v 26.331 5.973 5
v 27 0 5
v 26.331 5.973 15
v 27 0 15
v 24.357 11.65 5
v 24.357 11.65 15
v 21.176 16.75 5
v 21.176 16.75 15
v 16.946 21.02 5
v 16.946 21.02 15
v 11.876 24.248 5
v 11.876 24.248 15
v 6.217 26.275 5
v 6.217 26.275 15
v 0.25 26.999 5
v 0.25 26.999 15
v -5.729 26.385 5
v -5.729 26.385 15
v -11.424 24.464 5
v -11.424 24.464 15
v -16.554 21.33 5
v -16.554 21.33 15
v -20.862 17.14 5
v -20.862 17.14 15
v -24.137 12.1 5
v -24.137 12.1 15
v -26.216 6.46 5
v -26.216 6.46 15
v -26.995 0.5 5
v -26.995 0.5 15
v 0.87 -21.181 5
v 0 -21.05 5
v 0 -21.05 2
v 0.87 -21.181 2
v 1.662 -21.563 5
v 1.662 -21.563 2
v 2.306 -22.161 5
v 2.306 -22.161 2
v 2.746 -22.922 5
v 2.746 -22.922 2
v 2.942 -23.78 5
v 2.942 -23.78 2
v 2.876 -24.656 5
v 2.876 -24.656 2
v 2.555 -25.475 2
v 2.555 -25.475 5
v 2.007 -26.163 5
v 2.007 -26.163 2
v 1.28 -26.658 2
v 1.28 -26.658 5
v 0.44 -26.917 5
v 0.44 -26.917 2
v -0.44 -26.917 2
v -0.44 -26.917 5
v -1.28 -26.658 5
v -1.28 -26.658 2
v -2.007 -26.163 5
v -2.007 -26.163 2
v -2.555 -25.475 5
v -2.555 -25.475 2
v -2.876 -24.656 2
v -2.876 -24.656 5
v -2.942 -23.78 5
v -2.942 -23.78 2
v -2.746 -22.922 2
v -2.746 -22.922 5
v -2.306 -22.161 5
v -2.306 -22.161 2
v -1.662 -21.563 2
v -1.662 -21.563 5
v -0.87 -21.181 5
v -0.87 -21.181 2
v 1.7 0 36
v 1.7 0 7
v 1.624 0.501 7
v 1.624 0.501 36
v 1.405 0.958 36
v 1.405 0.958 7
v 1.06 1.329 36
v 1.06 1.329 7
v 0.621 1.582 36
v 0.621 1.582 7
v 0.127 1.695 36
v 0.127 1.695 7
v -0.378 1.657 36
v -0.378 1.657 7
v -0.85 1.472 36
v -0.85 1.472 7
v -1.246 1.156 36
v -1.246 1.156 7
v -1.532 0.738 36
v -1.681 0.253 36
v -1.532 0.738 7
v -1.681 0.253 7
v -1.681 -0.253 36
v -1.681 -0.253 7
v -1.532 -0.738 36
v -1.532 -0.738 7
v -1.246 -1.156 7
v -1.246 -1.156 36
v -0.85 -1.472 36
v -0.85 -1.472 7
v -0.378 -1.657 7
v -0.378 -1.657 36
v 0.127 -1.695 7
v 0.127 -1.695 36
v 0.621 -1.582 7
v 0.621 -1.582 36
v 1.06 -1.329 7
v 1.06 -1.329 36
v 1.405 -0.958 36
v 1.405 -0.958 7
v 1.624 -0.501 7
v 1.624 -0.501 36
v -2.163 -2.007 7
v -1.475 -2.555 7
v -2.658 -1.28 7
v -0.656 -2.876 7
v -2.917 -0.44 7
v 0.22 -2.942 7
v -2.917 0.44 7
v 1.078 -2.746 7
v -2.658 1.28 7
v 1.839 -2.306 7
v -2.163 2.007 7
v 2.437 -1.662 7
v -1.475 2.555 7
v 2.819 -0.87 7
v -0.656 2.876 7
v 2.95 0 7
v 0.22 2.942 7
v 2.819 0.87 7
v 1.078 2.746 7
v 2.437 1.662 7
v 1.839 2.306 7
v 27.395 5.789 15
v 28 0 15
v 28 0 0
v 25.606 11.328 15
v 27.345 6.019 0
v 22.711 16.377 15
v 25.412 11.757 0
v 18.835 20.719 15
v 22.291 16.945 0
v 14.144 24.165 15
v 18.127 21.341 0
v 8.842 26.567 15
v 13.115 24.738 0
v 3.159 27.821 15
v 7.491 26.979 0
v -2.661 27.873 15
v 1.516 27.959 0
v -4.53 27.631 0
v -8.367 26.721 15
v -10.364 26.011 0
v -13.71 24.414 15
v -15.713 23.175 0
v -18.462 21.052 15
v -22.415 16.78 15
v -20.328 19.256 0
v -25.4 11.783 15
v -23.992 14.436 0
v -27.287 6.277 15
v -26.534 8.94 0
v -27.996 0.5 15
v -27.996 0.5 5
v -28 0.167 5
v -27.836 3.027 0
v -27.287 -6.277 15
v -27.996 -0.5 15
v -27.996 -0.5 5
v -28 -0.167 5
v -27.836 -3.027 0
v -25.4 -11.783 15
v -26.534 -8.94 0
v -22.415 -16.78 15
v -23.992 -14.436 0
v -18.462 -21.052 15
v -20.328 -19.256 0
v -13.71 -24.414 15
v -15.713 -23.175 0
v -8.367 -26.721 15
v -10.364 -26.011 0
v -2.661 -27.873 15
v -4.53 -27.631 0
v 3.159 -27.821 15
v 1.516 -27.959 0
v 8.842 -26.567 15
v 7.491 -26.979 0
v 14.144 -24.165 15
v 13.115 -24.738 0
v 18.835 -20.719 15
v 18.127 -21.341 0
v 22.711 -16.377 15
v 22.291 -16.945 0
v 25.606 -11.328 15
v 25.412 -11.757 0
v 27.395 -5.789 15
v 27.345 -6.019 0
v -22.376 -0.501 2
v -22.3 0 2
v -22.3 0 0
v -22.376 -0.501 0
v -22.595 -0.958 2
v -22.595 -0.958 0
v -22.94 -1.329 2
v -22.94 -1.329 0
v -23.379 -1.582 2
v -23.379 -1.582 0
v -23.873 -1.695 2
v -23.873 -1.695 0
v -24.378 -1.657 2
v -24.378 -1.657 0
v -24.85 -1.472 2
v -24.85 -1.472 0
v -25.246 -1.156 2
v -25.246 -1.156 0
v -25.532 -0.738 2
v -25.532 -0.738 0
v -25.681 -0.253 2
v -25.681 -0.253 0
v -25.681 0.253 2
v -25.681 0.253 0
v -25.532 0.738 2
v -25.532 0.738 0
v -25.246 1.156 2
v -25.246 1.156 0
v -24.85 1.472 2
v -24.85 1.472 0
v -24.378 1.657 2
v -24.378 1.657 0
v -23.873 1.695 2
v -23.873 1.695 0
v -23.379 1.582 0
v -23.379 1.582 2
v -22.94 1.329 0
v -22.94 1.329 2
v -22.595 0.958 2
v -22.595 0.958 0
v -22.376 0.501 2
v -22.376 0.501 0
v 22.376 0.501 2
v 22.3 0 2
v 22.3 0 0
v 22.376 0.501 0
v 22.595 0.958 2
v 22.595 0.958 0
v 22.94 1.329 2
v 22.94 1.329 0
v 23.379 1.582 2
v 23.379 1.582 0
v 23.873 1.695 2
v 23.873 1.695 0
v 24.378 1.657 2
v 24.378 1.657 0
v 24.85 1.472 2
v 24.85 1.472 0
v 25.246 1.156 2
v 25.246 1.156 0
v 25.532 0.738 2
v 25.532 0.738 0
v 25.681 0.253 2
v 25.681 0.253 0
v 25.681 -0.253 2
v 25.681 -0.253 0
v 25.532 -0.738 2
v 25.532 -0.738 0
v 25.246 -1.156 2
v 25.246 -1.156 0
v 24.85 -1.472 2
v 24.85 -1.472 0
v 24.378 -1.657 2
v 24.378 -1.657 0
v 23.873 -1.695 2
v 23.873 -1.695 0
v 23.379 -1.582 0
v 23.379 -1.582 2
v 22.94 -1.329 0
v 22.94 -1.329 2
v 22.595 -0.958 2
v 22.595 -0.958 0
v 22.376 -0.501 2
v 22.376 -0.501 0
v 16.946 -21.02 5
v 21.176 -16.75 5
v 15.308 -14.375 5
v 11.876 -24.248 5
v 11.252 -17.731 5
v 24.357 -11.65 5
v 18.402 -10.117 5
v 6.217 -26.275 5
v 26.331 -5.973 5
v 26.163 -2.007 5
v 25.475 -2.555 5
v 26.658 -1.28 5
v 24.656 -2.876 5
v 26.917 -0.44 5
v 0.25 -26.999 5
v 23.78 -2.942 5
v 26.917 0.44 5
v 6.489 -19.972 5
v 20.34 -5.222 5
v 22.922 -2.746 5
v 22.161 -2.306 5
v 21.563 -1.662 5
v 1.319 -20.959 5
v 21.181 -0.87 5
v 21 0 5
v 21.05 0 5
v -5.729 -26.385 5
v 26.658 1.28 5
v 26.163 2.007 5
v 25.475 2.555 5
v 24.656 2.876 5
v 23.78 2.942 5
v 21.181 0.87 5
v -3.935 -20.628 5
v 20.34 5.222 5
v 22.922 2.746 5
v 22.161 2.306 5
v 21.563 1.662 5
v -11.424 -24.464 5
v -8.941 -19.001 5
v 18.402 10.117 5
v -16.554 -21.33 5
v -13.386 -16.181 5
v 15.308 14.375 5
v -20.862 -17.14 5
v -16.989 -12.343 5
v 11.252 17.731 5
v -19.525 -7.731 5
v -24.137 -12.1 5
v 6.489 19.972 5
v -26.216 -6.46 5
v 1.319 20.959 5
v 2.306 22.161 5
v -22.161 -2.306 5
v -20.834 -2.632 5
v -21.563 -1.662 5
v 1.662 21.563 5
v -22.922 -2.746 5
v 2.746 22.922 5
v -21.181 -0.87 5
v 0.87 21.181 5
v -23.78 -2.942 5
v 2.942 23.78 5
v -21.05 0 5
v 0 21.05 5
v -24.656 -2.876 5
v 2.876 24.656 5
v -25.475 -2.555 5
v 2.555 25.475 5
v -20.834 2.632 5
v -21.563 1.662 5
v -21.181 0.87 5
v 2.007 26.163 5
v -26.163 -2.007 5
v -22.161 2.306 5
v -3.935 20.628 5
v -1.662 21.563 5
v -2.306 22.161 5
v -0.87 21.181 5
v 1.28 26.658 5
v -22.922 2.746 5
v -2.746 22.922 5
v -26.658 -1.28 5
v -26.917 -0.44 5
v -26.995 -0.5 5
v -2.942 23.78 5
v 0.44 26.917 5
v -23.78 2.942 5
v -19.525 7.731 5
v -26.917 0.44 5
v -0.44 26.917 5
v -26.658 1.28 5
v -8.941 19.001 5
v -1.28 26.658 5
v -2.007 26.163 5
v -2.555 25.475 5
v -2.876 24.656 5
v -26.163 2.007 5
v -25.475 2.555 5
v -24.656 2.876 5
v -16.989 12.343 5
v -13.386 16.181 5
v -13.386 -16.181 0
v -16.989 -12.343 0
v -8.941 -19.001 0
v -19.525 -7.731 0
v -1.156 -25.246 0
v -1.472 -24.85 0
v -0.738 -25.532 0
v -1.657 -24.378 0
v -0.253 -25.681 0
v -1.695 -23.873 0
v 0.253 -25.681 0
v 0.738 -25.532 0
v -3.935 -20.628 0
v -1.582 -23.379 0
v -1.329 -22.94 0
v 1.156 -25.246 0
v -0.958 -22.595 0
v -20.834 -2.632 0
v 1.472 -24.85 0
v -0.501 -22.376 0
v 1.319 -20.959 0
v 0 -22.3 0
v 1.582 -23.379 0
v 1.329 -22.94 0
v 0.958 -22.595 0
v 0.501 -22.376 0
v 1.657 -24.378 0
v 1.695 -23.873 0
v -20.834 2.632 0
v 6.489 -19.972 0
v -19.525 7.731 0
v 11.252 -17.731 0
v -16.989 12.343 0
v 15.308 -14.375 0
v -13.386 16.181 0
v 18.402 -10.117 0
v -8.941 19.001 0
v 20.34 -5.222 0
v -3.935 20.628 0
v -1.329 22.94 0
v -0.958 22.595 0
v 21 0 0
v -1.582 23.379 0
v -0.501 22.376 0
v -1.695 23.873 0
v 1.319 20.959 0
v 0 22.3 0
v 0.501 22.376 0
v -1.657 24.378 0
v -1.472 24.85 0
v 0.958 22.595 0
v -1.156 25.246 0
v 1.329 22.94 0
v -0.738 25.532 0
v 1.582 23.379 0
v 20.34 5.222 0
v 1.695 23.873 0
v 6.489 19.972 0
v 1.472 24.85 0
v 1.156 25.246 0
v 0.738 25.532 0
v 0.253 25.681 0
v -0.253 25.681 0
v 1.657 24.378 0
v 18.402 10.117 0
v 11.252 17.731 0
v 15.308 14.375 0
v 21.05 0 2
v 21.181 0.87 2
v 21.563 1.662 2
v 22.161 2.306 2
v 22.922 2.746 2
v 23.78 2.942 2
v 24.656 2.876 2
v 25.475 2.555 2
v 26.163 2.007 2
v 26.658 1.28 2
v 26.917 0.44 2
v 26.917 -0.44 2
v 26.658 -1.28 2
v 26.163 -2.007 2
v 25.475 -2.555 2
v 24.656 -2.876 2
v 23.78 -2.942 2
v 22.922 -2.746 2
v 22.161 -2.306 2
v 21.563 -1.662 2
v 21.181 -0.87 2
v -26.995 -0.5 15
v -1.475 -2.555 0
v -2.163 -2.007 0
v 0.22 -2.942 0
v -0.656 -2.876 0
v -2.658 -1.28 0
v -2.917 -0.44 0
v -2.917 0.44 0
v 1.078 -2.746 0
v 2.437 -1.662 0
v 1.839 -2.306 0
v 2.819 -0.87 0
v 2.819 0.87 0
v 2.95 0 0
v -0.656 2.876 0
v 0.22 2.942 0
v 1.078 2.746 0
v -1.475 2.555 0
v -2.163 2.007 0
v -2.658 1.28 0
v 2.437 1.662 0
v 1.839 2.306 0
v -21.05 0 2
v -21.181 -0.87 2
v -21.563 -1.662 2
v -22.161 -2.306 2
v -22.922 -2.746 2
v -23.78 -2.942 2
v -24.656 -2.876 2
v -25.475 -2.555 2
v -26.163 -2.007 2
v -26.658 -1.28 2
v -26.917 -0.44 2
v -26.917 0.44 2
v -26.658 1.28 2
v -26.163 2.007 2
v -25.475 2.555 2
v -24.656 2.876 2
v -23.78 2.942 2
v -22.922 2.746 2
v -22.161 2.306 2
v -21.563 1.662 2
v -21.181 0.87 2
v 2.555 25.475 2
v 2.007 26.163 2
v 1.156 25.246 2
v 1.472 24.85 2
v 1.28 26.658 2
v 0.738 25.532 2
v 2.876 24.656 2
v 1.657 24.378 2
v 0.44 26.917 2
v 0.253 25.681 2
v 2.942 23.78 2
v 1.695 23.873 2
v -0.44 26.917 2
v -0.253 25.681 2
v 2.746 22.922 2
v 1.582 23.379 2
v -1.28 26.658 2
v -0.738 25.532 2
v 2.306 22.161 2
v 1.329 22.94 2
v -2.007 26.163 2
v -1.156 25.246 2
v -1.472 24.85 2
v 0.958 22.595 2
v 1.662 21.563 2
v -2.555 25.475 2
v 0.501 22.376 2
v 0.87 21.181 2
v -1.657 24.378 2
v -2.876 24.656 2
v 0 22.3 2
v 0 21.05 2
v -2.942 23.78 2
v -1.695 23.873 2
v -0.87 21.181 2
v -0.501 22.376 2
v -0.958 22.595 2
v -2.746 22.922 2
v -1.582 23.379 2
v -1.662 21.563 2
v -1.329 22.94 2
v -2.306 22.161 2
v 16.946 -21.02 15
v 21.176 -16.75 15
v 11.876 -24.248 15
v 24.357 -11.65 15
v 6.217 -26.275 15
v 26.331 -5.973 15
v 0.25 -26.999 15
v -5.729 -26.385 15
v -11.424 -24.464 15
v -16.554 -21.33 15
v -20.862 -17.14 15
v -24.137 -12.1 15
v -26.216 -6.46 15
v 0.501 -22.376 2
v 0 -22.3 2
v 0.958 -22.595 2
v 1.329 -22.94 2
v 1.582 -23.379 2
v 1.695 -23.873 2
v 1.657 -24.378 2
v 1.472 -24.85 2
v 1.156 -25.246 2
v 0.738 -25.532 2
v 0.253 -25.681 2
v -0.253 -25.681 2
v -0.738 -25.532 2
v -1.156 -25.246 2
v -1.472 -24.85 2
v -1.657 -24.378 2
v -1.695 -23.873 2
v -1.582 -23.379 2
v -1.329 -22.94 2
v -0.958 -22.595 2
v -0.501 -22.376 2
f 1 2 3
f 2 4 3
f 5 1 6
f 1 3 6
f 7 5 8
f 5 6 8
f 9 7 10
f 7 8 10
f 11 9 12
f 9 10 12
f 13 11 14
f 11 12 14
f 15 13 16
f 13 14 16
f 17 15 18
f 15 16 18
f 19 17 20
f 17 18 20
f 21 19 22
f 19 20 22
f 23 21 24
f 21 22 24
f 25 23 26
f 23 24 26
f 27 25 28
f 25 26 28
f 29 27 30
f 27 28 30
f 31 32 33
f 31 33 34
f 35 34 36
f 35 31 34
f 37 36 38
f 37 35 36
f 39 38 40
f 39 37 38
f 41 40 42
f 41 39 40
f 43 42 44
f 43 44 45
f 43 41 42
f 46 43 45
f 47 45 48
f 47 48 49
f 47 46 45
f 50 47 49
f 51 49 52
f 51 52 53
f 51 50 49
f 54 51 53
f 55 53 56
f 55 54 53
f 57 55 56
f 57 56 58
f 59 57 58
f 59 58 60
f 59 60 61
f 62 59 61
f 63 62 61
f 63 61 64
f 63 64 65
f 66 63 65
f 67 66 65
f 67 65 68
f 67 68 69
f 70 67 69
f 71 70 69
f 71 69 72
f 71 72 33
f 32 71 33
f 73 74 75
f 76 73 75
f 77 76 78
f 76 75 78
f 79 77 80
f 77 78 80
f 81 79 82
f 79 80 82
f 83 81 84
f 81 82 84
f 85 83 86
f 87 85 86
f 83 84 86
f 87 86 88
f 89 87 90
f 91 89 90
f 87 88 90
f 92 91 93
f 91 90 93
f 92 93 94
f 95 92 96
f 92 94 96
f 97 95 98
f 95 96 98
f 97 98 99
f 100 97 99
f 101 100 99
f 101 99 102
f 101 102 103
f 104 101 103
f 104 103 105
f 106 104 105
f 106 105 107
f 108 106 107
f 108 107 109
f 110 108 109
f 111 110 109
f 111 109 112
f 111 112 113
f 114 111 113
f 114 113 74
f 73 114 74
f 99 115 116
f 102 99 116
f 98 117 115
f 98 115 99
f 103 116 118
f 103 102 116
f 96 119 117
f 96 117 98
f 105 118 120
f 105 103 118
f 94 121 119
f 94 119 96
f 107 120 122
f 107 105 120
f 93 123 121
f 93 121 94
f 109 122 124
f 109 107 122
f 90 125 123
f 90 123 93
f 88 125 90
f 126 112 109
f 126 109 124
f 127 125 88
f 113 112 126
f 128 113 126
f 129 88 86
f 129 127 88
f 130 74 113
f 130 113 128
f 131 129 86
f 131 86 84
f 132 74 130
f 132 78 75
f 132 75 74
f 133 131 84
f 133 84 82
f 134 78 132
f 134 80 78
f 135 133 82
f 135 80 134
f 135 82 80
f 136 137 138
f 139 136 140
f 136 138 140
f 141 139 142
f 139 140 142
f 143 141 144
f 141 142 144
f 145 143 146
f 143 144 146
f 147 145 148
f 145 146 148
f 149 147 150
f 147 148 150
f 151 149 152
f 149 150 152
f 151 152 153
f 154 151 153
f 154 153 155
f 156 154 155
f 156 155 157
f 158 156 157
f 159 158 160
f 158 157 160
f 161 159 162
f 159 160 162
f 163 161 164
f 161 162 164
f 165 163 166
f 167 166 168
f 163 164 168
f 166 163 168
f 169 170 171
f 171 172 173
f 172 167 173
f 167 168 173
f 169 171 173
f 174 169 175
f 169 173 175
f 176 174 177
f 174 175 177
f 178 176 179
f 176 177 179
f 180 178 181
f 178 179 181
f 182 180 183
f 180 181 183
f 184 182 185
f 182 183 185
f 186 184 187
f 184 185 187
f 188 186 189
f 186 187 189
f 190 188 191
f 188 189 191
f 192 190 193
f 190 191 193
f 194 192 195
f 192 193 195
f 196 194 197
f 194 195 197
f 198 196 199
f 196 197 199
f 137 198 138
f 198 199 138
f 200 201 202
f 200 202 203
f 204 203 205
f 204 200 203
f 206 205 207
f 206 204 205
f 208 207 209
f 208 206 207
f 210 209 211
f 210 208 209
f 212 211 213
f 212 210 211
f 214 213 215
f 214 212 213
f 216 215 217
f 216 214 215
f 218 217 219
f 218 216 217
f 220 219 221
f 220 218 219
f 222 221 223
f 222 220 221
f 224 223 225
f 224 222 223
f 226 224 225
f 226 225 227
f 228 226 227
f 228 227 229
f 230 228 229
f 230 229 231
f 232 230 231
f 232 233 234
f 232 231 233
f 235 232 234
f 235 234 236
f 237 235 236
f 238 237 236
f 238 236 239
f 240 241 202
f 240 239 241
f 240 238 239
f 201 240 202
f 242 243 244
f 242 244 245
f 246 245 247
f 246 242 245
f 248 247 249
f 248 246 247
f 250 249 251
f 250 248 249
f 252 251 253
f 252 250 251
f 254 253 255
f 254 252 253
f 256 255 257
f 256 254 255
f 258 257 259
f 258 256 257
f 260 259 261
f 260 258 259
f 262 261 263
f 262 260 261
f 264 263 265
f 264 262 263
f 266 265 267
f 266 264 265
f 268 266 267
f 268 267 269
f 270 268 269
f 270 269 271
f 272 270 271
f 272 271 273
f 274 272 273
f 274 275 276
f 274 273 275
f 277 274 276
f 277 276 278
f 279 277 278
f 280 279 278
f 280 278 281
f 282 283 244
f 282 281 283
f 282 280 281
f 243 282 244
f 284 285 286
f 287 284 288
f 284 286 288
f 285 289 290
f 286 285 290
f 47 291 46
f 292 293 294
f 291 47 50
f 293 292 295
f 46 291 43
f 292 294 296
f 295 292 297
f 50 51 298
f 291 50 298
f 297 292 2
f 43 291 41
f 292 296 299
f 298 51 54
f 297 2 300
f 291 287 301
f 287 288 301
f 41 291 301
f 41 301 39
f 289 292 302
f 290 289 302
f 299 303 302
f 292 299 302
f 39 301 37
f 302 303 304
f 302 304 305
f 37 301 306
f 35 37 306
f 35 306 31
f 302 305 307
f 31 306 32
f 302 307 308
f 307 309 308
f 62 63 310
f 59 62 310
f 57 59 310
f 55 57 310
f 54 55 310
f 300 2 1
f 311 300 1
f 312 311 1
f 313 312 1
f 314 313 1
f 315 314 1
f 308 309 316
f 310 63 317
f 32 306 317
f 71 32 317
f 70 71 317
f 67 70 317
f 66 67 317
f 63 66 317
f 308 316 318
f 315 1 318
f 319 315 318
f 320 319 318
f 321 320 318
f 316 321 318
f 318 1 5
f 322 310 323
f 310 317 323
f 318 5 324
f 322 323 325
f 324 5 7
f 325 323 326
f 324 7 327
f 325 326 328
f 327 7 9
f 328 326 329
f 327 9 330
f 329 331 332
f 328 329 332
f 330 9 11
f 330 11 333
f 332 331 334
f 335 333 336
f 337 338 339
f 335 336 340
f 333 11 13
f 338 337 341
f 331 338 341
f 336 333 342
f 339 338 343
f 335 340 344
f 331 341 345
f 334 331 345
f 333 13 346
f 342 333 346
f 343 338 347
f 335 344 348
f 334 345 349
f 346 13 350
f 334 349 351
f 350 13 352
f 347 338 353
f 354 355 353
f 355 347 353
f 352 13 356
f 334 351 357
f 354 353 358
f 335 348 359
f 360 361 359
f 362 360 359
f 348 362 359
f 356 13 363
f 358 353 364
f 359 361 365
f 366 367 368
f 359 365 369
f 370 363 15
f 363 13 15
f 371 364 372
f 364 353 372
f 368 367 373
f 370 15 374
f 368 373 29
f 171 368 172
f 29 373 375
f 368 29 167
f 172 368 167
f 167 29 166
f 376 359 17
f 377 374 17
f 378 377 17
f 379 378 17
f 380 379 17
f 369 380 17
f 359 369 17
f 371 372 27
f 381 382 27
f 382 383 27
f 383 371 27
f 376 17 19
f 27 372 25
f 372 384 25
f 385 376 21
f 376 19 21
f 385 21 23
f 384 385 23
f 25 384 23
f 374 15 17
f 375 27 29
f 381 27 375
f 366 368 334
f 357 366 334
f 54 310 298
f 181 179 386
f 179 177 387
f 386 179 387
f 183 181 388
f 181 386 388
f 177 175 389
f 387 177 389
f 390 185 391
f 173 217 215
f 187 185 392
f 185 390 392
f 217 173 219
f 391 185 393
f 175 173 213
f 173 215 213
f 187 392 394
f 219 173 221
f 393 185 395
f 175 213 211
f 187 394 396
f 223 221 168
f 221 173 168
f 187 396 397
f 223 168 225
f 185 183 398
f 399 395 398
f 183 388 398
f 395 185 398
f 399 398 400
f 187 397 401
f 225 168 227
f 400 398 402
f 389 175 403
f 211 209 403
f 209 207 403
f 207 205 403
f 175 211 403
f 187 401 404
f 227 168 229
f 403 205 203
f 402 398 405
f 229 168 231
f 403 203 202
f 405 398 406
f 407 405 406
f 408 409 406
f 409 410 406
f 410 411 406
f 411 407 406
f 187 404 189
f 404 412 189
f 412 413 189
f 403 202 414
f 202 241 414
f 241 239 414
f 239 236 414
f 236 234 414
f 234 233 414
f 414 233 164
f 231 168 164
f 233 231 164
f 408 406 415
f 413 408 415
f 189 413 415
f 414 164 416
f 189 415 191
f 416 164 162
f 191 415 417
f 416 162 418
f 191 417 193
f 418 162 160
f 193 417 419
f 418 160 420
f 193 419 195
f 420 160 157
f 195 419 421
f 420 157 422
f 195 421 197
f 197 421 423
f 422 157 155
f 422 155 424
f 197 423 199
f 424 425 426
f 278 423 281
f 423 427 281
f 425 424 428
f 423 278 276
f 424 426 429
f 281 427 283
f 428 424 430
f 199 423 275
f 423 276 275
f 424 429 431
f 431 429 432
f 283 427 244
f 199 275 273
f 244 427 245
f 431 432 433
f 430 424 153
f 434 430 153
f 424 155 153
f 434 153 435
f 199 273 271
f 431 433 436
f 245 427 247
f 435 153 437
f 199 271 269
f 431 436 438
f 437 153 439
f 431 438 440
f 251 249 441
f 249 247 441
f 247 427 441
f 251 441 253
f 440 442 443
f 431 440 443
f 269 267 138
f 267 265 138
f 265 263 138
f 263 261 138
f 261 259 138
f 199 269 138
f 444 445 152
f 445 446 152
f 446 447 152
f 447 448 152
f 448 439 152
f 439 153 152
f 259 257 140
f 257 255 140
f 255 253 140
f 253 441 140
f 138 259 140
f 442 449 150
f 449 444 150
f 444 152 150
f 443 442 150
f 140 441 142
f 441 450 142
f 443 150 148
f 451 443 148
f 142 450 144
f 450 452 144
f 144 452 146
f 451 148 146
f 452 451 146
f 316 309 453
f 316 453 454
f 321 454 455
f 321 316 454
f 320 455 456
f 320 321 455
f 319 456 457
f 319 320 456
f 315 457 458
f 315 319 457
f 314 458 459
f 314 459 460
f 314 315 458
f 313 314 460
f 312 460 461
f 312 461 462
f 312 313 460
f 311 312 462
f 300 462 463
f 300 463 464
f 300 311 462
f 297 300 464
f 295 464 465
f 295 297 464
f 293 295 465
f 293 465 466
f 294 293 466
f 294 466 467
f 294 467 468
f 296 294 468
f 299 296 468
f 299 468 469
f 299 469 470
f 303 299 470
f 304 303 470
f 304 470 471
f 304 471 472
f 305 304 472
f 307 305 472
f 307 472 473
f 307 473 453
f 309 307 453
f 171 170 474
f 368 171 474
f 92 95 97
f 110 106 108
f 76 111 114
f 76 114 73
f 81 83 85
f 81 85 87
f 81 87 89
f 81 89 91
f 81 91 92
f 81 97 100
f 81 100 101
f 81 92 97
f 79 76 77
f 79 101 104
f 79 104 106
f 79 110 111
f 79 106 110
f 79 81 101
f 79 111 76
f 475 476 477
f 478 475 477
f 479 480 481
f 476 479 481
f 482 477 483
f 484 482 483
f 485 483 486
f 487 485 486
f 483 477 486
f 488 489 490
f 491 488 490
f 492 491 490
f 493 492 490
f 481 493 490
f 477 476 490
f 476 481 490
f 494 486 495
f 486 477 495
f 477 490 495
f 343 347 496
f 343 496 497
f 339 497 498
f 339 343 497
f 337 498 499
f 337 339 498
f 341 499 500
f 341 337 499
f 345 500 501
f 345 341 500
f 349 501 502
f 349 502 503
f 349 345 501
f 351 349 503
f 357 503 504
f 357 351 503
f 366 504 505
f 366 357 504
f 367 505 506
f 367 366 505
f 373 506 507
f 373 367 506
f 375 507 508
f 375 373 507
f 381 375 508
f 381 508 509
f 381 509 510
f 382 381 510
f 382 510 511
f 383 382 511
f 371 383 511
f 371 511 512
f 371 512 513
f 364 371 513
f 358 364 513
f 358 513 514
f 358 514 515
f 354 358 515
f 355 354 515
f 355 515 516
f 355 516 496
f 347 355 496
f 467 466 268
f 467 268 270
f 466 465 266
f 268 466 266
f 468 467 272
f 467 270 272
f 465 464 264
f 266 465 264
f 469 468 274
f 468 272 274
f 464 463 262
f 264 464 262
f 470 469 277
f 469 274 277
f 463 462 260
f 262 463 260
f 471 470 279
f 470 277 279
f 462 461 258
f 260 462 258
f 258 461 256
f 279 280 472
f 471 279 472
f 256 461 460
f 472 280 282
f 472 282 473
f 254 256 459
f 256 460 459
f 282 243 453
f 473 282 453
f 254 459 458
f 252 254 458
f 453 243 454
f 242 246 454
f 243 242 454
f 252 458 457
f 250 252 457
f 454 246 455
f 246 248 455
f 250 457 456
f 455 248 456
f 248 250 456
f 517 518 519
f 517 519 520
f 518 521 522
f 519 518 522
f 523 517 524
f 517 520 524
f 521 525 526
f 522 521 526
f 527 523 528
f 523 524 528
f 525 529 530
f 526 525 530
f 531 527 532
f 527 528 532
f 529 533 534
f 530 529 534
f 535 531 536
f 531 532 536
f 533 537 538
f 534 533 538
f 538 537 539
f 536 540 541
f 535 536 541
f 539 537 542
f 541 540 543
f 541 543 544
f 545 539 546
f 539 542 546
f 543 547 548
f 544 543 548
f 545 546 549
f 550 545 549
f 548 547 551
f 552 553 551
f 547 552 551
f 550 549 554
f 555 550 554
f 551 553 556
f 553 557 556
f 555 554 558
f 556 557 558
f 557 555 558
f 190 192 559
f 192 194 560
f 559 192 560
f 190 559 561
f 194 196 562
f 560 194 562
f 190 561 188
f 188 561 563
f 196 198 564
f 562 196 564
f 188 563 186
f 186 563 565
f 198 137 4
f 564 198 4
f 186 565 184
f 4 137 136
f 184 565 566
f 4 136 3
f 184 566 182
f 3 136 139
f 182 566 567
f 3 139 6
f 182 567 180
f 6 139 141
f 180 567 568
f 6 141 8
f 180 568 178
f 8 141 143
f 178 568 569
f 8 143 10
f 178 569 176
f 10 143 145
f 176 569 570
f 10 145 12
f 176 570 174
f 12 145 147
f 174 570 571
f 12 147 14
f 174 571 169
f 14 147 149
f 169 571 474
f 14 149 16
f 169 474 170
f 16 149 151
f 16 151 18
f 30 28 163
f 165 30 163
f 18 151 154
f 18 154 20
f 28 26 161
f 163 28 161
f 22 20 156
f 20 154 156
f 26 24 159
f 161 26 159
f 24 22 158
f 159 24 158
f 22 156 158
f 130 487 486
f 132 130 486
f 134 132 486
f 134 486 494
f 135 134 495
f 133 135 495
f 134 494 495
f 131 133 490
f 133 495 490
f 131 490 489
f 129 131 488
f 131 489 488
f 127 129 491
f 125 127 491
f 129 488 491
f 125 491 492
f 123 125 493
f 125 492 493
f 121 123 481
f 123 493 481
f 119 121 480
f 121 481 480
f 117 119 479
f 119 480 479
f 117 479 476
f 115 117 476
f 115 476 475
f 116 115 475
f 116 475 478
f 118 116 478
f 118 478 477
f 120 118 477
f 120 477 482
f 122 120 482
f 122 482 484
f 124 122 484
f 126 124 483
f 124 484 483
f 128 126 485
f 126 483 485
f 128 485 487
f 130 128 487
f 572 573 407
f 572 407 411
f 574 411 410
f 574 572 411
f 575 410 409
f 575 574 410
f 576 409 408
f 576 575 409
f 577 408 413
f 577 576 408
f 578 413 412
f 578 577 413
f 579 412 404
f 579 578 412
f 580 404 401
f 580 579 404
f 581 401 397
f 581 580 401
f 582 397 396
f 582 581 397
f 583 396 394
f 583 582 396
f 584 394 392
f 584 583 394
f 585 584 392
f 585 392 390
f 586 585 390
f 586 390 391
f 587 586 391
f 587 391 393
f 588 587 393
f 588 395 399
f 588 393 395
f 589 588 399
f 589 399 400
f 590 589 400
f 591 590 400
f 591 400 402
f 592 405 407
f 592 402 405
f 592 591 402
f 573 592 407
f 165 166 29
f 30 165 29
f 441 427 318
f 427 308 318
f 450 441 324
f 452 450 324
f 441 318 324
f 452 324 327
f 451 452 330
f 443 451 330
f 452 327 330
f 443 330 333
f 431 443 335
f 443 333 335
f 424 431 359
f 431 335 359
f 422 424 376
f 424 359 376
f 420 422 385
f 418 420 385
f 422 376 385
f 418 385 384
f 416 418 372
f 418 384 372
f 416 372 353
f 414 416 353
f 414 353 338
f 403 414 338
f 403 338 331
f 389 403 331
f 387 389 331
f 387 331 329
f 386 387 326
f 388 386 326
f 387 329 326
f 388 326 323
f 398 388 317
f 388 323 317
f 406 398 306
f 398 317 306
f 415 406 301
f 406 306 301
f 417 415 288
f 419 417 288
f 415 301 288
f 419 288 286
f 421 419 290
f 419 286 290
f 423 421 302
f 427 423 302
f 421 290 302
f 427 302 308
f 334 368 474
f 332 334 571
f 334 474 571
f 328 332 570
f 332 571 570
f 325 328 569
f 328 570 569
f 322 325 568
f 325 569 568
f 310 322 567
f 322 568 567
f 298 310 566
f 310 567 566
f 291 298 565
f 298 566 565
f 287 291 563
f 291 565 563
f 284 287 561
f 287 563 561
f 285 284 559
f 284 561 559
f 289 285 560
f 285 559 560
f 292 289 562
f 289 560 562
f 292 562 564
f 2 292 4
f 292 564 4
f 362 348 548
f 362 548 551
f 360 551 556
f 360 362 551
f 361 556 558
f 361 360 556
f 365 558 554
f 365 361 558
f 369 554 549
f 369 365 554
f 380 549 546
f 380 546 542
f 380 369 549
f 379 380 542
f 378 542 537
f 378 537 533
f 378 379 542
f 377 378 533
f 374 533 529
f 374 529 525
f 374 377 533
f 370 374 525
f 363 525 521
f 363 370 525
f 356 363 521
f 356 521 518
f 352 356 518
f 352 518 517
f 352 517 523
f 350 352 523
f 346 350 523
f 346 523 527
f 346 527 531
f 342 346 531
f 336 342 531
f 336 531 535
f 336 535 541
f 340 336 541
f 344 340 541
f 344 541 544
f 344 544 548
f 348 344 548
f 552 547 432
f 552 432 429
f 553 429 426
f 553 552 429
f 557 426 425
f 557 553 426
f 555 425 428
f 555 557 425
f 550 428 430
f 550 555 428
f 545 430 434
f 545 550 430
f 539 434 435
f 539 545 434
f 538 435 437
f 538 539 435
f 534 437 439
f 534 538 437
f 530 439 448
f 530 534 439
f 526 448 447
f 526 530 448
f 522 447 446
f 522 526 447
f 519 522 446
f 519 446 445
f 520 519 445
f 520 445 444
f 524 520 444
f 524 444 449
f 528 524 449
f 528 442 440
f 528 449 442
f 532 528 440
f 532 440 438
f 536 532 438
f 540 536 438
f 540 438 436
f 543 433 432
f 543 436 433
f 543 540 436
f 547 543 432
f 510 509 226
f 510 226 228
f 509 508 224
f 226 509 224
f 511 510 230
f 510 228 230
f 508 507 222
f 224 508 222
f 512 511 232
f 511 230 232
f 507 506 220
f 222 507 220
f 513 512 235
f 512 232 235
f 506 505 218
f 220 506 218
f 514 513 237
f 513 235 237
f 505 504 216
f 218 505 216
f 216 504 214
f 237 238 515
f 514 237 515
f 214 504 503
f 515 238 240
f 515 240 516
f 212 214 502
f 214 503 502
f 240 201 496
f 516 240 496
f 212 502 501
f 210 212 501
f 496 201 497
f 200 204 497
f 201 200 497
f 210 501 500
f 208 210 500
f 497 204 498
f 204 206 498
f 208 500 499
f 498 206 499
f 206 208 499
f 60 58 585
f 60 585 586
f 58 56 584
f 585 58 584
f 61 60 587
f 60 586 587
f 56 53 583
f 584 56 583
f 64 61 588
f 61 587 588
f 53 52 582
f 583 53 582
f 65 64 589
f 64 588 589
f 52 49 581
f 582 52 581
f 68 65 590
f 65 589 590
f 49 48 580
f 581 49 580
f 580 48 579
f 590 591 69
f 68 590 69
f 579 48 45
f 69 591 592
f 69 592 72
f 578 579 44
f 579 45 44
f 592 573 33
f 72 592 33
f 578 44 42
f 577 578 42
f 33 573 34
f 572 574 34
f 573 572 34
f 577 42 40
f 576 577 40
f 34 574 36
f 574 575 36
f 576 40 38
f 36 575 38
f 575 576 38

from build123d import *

# Parameters (mm, degrees)
CYLINDER_R               = 2.95
CYLINDER_DEPTH           = 7
CYLINDER001_R            = 1.7
CYLINDER001_DEPTH        = 30
BOX260_W                 = 10
BOX260_H                 = 1
BOX260_DEPTH             = 11
CLONE359_PLACEMENT_ANGLE = 180
ARRAY018_COUNT           = 4


with BuildPart() as m3bolthead:
    # Cylinder → Cylinder (new body)
    with BuildSketch(Plane.XY):
        Circle(CYLINDER_R)
    extrude(amount=CYLINDER_DEPTH)


with BuildPart() as m3bolt:
    # Cylinder001 → Cylinder001 (new body)
    with BuildSketch(Plane.XY.offset(6)):
        Circle(CYLINDER001_R)
    extrude(amount=CYLINDER001_DEPTH)

    # Fusion: union M3BoltHead
    add(m3bolthead.part)


with BuildPart() as cube023:
    # Box260 → Box260 (new body)
    with BuildSketch(Plane(origin=(-33.5, -0.5, 5), x_dir=(1, 0, 0), z_dir=(0, 0, 1))):
        with Locations((5, 0.5)):
            Rectangle(BOX260_W, BOX260_H)
    extrude(amount=BOX260_DEPTH)


with BuildPart() as array018:
    # Clone359 base: copy of M3Bolt
    add(m3bolt.part)


with BuildPart() as array018_1:
    # Clone359 placement: moved
    add(array018.part.moved(Location((24, 0, 9))).rotate(Axis((24, 0, 9), (0, 1, 0)), CLONE359_PLACEMENT_ANGLE))

    # Array018: Array018 ×4 about axis
    array018_axis = Axis((0, 0, 0), (0, 0, 1))


with BuildPart() as array018_2:
    add(array018_1.part)
    for i in range(1, ARRAY018_COUNT):
        add(array018_1.part.rotate(array018_axis, i * 360 / ARRAY018_COUNT))


with BuildPart() as art4optodisk:
    # Sketch071 → Revolution017 (revolve)
    with BuildSketch(Plane.XZ):
        Polygon((27, 15), (28, 15), (28, 0), (21, 0), (21, 5), (27, 5), align=None)
    revolve(axis=Axis((0, 0, 0), (0, 0, 1)))

    # Cut114: cut Array018
    add(array018_2.part, mode=Mode.SUBTRACT)

    # Cut115: cut Cube023
    add(cube023.part, mode=Mode.SUBTRACT)


solid = Compound([m3bolt.part, art4optodisk.part])
